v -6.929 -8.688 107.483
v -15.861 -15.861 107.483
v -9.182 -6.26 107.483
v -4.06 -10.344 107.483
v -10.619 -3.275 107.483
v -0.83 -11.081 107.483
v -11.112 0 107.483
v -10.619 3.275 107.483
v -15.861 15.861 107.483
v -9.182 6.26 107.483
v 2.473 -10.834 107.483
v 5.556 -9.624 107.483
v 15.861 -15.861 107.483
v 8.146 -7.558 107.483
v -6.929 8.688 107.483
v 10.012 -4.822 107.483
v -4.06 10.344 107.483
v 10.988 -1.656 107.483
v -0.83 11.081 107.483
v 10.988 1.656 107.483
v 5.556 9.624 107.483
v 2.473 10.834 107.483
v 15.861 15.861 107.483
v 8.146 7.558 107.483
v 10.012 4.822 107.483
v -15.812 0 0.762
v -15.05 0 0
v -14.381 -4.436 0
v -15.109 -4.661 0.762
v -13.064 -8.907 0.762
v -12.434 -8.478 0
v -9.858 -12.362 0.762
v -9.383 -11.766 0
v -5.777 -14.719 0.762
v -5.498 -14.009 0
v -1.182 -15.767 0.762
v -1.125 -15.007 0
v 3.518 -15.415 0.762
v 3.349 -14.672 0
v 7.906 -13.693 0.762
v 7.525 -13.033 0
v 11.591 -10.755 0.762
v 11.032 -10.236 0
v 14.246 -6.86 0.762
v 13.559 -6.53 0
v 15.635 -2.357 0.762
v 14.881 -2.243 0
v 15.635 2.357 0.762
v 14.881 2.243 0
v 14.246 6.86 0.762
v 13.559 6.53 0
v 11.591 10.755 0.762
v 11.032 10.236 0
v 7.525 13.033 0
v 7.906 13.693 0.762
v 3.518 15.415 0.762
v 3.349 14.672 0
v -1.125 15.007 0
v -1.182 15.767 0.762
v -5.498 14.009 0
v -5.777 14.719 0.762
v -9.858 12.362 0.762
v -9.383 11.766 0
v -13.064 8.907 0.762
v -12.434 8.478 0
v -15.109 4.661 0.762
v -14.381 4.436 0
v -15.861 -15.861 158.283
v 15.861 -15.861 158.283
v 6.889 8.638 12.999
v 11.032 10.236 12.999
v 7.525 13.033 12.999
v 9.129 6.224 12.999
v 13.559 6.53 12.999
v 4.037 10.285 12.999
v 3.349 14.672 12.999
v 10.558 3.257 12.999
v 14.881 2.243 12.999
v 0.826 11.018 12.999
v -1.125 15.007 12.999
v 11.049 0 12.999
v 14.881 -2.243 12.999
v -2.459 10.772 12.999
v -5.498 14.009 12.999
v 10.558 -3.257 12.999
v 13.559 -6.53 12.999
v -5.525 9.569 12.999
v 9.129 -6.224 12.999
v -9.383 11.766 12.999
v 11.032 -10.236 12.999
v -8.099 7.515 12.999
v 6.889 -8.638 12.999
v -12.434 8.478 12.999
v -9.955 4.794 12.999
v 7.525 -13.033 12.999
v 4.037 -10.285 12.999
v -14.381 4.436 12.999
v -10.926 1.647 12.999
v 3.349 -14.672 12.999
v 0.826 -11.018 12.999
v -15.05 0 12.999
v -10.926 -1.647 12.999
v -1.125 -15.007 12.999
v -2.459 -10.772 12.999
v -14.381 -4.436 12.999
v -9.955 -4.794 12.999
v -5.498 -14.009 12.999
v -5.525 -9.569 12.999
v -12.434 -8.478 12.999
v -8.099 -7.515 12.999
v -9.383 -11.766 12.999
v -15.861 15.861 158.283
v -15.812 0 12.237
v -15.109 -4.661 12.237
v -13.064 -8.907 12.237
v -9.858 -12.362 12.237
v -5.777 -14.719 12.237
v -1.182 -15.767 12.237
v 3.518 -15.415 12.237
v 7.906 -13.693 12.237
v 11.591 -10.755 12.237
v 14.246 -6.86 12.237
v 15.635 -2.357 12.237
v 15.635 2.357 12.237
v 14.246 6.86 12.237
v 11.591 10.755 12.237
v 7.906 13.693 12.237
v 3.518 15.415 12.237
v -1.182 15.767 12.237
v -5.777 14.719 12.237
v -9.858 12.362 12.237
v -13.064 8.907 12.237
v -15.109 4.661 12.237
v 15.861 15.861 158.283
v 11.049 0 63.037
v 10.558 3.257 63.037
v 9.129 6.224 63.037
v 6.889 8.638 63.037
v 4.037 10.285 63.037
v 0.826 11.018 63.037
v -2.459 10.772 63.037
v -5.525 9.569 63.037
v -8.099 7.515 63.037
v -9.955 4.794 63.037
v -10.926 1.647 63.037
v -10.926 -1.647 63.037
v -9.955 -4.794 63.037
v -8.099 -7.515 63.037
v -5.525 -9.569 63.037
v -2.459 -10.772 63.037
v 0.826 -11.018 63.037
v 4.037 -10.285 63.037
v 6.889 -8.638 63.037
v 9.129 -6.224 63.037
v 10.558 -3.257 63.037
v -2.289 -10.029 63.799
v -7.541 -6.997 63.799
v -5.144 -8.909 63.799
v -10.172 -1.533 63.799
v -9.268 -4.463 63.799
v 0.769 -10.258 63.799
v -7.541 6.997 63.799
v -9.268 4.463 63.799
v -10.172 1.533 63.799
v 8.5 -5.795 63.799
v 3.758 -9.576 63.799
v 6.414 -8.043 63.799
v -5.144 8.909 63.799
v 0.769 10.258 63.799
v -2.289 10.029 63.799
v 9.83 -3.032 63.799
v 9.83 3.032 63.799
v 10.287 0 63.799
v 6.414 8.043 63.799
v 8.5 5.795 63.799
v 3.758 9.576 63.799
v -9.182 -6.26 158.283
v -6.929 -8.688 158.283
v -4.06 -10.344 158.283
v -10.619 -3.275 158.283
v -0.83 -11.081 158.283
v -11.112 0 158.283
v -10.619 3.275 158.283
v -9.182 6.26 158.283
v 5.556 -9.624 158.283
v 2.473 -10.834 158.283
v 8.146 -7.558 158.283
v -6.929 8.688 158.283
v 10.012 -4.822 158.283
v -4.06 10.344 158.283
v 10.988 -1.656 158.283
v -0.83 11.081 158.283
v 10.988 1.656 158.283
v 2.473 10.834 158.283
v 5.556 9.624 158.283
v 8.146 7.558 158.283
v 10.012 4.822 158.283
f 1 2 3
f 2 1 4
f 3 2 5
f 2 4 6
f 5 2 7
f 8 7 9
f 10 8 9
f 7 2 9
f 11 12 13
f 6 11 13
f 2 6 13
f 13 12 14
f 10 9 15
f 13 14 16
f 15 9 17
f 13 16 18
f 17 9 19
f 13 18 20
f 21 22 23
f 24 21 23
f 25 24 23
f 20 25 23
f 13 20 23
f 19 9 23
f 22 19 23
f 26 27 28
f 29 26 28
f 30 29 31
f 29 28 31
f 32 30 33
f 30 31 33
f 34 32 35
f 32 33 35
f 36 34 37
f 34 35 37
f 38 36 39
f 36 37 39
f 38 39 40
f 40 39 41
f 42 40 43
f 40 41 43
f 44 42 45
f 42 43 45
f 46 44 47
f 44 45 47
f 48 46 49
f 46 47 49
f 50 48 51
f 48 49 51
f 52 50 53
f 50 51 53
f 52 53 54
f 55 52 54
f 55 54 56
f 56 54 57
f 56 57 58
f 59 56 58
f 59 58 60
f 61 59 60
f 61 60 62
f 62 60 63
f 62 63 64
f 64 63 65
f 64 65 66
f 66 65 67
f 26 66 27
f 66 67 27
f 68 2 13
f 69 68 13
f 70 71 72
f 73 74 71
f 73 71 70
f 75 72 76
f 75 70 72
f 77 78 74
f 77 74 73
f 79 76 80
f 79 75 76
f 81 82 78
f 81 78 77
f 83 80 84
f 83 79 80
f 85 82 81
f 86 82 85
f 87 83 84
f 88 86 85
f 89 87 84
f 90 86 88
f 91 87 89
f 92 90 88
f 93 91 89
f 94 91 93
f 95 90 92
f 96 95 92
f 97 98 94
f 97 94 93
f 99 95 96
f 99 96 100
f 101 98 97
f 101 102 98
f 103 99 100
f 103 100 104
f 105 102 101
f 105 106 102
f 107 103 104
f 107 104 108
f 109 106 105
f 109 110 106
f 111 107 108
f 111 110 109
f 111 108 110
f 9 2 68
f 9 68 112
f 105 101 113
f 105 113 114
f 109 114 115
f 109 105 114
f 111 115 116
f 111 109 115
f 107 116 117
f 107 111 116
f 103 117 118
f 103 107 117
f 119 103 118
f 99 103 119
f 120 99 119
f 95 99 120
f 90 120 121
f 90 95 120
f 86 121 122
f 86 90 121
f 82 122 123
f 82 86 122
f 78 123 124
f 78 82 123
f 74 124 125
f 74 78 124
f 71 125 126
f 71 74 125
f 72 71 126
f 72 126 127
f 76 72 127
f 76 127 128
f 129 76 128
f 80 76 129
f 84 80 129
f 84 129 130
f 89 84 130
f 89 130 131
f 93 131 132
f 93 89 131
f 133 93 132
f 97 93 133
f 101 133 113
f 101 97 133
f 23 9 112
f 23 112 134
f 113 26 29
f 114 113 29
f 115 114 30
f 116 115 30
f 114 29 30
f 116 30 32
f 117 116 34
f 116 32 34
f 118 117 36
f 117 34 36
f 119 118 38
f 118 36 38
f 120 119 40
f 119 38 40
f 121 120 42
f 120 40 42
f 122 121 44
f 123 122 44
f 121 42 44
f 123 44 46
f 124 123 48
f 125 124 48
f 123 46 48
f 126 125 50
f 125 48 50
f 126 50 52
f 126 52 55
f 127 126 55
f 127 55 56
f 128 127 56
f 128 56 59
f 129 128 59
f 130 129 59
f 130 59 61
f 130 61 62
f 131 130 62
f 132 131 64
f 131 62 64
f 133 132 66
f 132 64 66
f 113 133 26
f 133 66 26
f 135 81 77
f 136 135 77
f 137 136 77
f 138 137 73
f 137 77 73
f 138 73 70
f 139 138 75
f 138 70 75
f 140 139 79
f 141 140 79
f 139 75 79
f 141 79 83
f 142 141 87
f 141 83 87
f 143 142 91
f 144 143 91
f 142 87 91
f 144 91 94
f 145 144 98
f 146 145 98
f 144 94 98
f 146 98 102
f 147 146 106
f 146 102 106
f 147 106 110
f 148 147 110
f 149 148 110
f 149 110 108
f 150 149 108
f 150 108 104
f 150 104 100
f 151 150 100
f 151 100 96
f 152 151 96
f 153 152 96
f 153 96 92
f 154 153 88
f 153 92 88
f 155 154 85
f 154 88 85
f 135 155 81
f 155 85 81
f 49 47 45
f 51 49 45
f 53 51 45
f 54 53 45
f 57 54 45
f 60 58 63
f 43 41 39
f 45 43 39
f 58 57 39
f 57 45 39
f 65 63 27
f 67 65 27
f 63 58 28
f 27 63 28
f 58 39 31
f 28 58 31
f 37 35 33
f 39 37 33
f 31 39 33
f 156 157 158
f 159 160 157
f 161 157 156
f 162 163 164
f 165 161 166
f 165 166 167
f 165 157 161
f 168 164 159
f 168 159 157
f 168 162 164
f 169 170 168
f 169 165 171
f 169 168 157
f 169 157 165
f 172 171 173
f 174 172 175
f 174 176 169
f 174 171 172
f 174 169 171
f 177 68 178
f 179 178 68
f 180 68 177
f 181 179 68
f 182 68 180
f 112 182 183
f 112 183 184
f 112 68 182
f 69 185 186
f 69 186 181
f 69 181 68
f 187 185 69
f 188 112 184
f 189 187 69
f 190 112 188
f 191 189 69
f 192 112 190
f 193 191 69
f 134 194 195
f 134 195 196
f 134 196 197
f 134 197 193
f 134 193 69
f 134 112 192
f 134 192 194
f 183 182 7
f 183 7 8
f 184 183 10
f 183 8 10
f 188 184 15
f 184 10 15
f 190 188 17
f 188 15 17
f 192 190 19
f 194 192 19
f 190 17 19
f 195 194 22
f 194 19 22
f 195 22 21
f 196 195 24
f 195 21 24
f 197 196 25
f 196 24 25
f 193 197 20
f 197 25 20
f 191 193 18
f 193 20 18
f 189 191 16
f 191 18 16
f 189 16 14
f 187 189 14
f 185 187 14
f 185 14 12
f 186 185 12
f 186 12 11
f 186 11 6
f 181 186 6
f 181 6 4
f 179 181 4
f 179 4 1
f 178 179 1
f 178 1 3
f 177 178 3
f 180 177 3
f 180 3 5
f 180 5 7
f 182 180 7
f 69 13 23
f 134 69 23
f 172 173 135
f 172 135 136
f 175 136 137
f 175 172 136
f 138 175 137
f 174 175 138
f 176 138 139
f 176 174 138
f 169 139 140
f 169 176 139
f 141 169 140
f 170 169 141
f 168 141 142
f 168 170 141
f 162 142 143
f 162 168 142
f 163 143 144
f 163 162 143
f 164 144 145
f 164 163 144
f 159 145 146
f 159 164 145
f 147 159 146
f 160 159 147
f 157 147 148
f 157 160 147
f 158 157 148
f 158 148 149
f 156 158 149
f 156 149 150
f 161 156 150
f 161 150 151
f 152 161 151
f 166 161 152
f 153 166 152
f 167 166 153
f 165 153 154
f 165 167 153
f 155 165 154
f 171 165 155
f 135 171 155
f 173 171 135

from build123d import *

# Parameters (mm, degrees)
SKETCH1_R           = 15.8115
BOSS_EXTRUDE1_DEPTH = 12.998823529
SKETCH2_R           = 11.049
BOSS_EXTRUDE2_DEPTH = 50.8
SKETCH3_W           = 31.722698392
SKETCH3_H           = 31.722698392
BOSS_EXTRUDE3_DEPTH = 50.8
SKETCH4_R           = 11.1125
CUT_EXTRUDE1_DEPTH  = 110.798996017
CHAMFER1_SIZE       = 0.762


with BuildPart() as part:
    # Sketch1 → Boss-Extrude1 (new body)
    with BuildSketch(Plane.XY):
        with Locations(Location((0, 0, 0), (0, 0, 180))):
            Circle(SKETCH1_R)
    extrude(amount=BOSS_EXTRUDE1_DEPTH)

    # Sketch2 → Boss-Extrude2 (add)
    with BuildSketch(Plane.XY.offset(12.998823529)):
        Circle(SKETCH2_R)
    extrude(amount=BOSS_EXTRUDE2_DEPTH)

    # Chamfer1
    chamfer1_edges = [part.edges().sort_by_distance(p)[0] for p in [
        (15.8115, 0, 0),
        (15.8115, 0, 12.998823529),
        (-11.049, 0, 63.798823529),
    ]]
    chamfer(chamfer1_edges, length=CHAMFER1_SIZE)


with BuildPart() as body_2:
    # Sketch3 → Boss-Extrude3 (new body)
    with BuildSketch(Plane.XY.offset(107.483276511)):
        Rectangle(SKETCH3_W, SKETCH3_H)
    extrude(amount=BOSS_EXTRUDE3_DEPTH)

    # Sketch4 → Cut-Extrude1 (cut, through all)
    with BuildSketch(Plane(origin=(0, 0, 107.483276511), x_dir=(-1, 0, 0), z_dir=(0, 0, -1))):
        Circle(SKETCH4_R)
    extrude(amount=-CUT_EXTRUDE1_DEPTH, mode=Mode.SUBTRACT)


solid = Compound([part.part, body_2.part])
